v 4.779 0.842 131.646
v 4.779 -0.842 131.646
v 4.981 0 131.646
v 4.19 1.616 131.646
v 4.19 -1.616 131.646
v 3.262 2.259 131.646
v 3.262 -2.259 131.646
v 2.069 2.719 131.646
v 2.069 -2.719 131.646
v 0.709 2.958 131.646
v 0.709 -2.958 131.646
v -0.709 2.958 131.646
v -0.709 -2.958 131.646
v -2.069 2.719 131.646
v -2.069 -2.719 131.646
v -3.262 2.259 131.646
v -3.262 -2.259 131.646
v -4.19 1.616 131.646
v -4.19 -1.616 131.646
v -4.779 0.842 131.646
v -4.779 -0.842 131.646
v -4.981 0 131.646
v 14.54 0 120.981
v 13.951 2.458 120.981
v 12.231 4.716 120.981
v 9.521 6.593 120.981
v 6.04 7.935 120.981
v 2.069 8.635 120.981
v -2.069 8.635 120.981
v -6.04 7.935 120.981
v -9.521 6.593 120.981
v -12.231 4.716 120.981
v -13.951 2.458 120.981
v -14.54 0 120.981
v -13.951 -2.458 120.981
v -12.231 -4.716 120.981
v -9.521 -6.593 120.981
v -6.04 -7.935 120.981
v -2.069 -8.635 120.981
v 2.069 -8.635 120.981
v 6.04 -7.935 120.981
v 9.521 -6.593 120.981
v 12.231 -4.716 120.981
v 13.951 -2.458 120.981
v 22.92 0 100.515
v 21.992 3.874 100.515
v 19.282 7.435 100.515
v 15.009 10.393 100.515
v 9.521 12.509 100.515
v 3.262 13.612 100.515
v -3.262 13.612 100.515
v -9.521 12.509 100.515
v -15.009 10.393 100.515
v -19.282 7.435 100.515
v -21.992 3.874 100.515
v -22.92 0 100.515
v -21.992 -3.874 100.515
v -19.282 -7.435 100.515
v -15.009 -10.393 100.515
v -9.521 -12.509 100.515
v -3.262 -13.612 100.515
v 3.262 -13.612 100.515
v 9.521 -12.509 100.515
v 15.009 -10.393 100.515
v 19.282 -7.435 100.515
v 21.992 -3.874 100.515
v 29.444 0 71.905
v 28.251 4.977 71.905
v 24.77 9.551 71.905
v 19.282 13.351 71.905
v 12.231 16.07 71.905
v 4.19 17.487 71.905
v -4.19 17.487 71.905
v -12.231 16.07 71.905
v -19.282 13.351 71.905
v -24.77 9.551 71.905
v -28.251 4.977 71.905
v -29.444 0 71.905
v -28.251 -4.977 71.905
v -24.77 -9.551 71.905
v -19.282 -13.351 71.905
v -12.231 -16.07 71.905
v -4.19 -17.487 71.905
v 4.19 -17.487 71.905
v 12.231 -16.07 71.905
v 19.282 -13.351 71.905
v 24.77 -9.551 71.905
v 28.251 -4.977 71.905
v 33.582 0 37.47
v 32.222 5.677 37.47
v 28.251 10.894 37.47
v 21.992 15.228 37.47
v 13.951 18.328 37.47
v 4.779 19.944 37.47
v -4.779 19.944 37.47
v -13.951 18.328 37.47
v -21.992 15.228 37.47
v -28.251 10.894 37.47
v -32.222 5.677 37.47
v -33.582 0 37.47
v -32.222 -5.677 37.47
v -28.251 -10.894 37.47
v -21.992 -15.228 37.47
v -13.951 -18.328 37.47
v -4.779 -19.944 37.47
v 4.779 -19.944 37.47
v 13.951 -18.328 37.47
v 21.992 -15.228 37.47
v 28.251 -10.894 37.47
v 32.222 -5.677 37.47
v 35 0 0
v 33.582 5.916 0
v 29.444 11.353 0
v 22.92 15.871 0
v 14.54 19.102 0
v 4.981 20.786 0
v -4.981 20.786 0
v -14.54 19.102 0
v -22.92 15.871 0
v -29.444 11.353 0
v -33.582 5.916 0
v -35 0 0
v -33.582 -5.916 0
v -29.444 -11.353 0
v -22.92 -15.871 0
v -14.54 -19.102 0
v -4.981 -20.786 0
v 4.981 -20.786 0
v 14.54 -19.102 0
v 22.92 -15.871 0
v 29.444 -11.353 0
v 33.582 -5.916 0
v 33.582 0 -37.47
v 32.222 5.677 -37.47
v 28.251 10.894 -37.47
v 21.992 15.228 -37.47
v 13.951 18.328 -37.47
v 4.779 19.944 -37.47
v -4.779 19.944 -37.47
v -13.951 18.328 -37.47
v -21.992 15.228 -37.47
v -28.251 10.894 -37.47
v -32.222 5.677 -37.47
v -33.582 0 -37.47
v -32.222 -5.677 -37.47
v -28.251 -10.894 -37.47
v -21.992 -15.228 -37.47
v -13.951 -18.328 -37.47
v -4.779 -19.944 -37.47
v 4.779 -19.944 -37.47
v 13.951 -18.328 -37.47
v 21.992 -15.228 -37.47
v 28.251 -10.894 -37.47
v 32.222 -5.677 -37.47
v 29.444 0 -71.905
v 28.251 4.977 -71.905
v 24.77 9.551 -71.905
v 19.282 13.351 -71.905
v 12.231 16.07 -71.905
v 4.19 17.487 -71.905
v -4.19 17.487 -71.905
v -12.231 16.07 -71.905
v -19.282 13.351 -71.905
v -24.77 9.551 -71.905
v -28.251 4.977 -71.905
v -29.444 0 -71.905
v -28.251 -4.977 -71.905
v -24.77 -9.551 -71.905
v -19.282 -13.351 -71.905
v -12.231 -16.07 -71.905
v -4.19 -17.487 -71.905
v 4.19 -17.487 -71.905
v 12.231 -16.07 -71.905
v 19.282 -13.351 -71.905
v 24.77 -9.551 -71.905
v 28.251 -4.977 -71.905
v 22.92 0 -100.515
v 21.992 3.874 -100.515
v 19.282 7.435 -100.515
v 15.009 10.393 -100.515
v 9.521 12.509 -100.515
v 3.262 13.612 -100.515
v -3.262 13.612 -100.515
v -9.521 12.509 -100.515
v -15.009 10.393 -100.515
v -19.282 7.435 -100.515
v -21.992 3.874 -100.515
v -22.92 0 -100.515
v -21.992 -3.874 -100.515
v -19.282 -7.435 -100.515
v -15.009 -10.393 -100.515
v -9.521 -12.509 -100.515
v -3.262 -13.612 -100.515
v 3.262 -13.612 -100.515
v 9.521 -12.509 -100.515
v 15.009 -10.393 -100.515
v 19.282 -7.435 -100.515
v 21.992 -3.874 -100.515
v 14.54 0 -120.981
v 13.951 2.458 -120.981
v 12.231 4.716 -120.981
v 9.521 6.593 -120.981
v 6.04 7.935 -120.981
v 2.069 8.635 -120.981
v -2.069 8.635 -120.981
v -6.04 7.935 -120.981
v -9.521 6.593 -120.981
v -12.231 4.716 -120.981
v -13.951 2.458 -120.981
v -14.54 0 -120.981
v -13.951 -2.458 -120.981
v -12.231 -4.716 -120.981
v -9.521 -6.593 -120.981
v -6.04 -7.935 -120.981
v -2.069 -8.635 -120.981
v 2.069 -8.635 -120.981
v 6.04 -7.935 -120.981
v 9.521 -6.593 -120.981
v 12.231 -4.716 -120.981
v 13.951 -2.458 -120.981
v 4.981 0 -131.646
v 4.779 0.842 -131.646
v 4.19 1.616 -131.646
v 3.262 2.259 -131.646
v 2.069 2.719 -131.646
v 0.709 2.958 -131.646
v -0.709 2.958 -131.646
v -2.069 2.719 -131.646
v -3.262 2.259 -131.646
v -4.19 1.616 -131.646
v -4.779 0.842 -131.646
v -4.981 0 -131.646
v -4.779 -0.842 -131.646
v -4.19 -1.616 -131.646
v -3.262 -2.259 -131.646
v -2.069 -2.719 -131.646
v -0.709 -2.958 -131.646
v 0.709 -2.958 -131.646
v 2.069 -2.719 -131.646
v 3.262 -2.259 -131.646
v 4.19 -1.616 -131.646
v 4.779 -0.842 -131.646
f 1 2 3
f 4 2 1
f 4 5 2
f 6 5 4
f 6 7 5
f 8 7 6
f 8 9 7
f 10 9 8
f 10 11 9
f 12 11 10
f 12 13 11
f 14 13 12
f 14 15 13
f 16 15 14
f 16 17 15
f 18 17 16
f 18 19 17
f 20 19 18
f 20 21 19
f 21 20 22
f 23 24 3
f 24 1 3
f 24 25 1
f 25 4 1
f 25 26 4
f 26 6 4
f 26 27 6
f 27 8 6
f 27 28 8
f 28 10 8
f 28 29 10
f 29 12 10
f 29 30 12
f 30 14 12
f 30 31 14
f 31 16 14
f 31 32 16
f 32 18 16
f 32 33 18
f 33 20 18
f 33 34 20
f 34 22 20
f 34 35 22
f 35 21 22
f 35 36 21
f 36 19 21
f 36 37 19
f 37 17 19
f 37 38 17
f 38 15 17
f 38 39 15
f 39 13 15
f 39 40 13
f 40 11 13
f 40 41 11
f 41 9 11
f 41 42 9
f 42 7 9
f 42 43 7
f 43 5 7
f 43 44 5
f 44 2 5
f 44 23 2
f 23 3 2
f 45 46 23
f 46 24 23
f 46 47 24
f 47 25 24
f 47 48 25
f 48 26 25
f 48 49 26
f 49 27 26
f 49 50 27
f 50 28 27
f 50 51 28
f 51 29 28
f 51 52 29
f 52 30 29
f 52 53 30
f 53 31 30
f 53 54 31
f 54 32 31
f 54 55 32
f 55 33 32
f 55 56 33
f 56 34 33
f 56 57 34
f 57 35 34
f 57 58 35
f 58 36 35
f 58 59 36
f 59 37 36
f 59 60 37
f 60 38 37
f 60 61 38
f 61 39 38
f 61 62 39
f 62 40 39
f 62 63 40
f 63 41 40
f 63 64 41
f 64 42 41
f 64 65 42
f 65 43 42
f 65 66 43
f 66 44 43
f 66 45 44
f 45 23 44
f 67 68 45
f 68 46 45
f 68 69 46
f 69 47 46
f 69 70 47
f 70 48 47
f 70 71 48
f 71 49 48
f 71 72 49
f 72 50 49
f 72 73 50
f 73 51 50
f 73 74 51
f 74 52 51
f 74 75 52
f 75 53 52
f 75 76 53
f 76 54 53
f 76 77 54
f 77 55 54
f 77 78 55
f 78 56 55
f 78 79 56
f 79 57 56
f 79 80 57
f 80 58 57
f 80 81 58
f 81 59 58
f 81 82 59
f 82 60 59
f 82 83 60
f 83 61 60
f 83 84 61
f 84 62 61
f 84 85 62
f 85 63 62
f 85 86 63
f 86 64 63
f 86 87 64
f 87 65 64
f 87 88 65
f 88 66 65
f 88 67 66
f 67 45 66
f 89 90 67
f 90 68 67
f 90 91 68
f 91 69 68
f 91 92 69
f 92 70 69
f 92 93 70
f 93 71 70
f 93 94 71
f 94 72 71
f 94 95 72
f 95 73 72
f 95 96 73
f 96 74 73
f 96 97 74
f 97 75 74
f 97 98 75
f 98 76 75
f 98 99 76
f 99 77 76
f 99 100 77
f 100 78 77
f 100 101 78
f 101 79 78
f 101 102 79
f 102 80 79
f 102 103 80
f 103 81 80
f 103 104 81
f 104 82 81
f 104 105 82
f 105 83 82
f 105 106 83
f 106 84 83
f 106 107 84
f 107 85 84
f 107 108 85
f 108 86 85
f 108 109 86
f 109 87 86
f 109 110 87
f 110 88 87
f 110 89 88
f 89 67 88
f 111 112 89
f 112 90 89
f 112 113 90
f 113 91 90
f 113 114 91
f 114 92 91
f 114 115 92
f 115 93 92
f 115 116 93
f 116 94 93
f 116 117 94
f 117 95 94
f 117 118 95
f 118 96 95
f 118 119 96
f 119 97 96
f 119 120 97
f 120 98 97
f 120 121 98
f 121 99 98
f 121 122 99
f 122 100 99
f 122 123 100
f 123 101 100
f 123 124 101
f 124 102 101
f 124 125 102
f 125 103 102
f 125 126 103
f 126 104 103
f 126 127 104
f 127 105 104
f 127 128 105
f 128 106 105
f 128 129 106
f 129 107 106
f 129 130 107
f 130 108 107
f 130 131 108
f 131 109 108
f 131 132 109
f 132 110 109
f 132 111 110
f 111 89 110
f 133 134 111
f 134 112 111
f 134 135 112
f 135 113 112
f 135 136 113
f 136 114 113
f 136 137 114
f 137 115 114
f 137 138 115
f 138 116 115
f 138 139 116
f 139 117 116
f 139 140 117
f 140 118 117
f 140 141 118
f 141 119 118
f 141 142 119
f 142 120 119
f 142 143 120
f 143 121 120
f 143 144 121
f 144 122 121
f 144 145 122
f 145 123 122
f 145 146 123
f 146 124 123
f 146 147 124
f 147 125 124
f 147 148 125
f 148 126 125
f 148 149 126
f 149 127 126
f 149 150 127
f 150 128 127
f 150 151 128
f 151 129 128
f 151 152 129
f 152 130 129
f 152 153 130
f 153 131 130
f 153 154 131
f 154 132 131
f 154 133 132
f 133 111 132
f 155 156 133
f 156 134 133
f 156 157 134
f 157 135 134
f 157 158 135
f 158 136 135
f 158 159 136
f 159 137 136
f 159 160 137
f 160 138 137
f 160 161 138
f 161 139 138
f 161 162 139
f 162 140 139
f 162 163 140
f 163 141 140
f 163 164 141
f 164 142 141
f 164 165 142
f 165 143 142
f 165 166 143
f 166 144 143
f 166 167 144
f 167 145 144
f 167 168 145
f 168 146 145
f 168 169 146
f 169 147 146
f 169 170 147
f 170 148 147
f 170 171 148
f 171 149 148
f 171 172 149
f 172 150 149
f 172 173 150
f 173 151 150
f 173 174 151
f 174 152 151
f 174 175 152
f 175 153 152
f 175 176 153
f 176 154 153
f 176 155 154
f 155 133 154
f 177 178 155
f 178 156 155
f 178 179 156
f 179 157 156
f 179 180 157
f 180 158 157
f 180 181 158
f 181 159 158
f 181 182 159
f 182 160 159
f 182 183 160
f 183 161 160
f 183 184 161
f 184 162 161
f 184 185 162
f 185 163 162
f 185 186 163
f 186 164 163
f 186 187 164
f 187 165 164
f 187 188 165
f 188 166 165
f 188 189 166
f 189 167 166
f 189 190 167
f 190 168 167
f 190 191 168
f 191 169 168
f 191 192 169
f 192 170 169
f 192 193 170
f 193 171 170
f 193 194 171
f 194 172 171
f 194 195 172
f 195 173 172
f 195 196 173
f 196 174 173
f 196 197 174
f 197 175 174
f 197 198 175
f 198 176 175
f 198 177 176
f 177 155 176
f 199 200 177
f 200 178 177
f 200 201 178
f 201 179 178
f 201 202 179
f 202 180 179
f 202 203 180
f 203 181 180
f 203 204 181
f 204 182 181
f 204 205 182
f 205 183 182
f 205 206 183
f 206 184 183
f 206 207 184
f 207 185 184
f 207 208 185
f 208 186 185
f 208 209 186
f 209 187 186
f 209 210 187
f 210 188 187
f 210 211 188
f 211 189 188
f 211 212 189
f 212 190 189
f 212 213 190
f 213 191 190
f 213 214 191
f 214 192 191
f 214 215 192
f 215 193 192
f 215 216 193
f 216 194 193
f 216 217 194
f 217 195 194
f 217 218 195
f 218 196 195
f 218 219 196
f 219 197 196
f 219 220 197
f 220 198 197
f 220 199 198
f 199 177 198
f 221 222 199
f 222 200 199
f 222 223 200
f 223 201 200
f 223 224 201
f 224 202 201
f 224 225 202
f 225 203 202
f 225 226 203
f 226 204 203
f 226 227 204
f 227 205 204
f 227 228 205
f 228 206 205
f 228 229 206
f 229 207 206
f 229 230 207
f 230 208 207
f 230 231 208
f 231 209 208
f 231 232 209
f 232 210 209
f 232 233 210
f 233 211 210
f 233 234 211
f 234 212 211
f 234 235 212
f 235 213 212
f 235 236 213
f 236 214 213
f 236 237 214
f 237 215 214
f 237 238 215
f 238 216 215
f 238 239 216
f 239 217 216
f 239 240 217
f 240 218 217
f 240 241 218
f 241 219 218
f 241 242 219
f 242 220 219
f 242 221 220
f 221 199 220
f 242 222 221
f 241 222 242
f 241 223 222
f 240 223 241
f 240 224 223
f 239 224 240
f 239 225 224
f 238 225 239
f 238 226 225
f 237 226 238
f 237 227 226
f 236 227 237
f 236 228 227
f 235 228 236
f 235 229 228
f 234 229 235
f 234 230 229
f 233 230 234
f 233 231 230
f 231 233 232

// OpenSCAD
// Generated by SolidPython 1.0.1 on 2020-07-29 00:46:46


scale(v = [5, 3, 19]) {
	sphere(r = 7);
}
/***********************************************
*********      SolidPython code:      **********
************************************************
 
# import packages: SolidPython
from solid import *
from solid.utils import *
from itertools import chain, combinations, permutations


class Resize:

    def __init__(self, scad_file):
        self.scad_file = scad_file
        #self.scad_file = import_scad(scad_file)
        # cone/cylinder param:
        self.r1 = 0
        self.r2 = 0
        self.h = 0
        # rectangular prism param:
        self.w = 0
        self.l = 0
        # ellipse param:
        self.r = 0

    # import OpenScad code (file name corresponds to shape)


    # classify shape + parameters
    def assign(self, param1, param2, param3):
        if self.scad_file == 'cone.scad':
            self.r1 = param1
            self.r2 = param2
            self.h = param3
        elif self.scad_file == 'cylinder.scad':
            self.r1 = param1
            self.r2 = param2
            self.h = param3
        elif self.scad_file == 'rectangularPrism.scad':
            self.h = param1
            self.l = param2
            self.w = param3
        else:
            self.r = param1
            self.h = param2

    # resize parameters
    def iterate(self):
        x = range(3, 20, 2)
        i = 1
        if self.scad_file == 'cone.scad':
            tempList = list(permutations(x, 2))
            for temp in tempList:
                param1 = temp[0]
                param2 = temp[1]
                filepath = 'produced_scad_files/' + 'cone' + str(param1) + '_' + str(param2) + '_' + '.scad'
                scad_render_to_file(cylinder(h=param1, r1=param2, r2=0), filepath)

        elif self.scad_file == 'cylinder.scad':
            tempList = list(permutations(x, 3))
            for temp in tempList:
                param1 = temp[0]
                param2 = temp[1]
                filepath = 'produced_scad_files/' + 'cylinder' + str(param1) + '_' + str(param2) + '_' + '.scad'
                scad_render_to_file(cylinder(h=param1, r1=param2, r2=param2), filepath)

        elif self.scad_file == 'rectangularPrism.scad':
            tempList = list(permutations(x, 3))
            for temp in tempList:
                param1 = temp[0]
                param2 = temp[1]
                param3 = temp[2]
                filepath = 'produced_scad_files/' + 'rectangularPrism' + str(param1) + '_' + str(param2) + '_' + str(
                    param3) + '.scad'
                scad_render_to_file(cube(size=(param1, param2, param3)), filepath)

        elif self.scad_file == 'ellipse.scad':
            tempList = list(permutations(x, 4))
            for temp in tempList:
                param1 = temp[0]
                param2 = temp[1]
                param3 = temp[2]
                param4 = temp[3]
                filepath = 'produced_scad_files/' + 'ellipse' + str(param1) + '_' + str(param2) + '_' + str(param3) + '_' + str(param4) + '.scad'
                scad_render_to_file(scale([param1, param2, param3])(sphere(r=param4)), filepath)

    def render_to_scadfile(self):
        scad_render_to_file(scad, 'example.scad') 
 
************************************************/
